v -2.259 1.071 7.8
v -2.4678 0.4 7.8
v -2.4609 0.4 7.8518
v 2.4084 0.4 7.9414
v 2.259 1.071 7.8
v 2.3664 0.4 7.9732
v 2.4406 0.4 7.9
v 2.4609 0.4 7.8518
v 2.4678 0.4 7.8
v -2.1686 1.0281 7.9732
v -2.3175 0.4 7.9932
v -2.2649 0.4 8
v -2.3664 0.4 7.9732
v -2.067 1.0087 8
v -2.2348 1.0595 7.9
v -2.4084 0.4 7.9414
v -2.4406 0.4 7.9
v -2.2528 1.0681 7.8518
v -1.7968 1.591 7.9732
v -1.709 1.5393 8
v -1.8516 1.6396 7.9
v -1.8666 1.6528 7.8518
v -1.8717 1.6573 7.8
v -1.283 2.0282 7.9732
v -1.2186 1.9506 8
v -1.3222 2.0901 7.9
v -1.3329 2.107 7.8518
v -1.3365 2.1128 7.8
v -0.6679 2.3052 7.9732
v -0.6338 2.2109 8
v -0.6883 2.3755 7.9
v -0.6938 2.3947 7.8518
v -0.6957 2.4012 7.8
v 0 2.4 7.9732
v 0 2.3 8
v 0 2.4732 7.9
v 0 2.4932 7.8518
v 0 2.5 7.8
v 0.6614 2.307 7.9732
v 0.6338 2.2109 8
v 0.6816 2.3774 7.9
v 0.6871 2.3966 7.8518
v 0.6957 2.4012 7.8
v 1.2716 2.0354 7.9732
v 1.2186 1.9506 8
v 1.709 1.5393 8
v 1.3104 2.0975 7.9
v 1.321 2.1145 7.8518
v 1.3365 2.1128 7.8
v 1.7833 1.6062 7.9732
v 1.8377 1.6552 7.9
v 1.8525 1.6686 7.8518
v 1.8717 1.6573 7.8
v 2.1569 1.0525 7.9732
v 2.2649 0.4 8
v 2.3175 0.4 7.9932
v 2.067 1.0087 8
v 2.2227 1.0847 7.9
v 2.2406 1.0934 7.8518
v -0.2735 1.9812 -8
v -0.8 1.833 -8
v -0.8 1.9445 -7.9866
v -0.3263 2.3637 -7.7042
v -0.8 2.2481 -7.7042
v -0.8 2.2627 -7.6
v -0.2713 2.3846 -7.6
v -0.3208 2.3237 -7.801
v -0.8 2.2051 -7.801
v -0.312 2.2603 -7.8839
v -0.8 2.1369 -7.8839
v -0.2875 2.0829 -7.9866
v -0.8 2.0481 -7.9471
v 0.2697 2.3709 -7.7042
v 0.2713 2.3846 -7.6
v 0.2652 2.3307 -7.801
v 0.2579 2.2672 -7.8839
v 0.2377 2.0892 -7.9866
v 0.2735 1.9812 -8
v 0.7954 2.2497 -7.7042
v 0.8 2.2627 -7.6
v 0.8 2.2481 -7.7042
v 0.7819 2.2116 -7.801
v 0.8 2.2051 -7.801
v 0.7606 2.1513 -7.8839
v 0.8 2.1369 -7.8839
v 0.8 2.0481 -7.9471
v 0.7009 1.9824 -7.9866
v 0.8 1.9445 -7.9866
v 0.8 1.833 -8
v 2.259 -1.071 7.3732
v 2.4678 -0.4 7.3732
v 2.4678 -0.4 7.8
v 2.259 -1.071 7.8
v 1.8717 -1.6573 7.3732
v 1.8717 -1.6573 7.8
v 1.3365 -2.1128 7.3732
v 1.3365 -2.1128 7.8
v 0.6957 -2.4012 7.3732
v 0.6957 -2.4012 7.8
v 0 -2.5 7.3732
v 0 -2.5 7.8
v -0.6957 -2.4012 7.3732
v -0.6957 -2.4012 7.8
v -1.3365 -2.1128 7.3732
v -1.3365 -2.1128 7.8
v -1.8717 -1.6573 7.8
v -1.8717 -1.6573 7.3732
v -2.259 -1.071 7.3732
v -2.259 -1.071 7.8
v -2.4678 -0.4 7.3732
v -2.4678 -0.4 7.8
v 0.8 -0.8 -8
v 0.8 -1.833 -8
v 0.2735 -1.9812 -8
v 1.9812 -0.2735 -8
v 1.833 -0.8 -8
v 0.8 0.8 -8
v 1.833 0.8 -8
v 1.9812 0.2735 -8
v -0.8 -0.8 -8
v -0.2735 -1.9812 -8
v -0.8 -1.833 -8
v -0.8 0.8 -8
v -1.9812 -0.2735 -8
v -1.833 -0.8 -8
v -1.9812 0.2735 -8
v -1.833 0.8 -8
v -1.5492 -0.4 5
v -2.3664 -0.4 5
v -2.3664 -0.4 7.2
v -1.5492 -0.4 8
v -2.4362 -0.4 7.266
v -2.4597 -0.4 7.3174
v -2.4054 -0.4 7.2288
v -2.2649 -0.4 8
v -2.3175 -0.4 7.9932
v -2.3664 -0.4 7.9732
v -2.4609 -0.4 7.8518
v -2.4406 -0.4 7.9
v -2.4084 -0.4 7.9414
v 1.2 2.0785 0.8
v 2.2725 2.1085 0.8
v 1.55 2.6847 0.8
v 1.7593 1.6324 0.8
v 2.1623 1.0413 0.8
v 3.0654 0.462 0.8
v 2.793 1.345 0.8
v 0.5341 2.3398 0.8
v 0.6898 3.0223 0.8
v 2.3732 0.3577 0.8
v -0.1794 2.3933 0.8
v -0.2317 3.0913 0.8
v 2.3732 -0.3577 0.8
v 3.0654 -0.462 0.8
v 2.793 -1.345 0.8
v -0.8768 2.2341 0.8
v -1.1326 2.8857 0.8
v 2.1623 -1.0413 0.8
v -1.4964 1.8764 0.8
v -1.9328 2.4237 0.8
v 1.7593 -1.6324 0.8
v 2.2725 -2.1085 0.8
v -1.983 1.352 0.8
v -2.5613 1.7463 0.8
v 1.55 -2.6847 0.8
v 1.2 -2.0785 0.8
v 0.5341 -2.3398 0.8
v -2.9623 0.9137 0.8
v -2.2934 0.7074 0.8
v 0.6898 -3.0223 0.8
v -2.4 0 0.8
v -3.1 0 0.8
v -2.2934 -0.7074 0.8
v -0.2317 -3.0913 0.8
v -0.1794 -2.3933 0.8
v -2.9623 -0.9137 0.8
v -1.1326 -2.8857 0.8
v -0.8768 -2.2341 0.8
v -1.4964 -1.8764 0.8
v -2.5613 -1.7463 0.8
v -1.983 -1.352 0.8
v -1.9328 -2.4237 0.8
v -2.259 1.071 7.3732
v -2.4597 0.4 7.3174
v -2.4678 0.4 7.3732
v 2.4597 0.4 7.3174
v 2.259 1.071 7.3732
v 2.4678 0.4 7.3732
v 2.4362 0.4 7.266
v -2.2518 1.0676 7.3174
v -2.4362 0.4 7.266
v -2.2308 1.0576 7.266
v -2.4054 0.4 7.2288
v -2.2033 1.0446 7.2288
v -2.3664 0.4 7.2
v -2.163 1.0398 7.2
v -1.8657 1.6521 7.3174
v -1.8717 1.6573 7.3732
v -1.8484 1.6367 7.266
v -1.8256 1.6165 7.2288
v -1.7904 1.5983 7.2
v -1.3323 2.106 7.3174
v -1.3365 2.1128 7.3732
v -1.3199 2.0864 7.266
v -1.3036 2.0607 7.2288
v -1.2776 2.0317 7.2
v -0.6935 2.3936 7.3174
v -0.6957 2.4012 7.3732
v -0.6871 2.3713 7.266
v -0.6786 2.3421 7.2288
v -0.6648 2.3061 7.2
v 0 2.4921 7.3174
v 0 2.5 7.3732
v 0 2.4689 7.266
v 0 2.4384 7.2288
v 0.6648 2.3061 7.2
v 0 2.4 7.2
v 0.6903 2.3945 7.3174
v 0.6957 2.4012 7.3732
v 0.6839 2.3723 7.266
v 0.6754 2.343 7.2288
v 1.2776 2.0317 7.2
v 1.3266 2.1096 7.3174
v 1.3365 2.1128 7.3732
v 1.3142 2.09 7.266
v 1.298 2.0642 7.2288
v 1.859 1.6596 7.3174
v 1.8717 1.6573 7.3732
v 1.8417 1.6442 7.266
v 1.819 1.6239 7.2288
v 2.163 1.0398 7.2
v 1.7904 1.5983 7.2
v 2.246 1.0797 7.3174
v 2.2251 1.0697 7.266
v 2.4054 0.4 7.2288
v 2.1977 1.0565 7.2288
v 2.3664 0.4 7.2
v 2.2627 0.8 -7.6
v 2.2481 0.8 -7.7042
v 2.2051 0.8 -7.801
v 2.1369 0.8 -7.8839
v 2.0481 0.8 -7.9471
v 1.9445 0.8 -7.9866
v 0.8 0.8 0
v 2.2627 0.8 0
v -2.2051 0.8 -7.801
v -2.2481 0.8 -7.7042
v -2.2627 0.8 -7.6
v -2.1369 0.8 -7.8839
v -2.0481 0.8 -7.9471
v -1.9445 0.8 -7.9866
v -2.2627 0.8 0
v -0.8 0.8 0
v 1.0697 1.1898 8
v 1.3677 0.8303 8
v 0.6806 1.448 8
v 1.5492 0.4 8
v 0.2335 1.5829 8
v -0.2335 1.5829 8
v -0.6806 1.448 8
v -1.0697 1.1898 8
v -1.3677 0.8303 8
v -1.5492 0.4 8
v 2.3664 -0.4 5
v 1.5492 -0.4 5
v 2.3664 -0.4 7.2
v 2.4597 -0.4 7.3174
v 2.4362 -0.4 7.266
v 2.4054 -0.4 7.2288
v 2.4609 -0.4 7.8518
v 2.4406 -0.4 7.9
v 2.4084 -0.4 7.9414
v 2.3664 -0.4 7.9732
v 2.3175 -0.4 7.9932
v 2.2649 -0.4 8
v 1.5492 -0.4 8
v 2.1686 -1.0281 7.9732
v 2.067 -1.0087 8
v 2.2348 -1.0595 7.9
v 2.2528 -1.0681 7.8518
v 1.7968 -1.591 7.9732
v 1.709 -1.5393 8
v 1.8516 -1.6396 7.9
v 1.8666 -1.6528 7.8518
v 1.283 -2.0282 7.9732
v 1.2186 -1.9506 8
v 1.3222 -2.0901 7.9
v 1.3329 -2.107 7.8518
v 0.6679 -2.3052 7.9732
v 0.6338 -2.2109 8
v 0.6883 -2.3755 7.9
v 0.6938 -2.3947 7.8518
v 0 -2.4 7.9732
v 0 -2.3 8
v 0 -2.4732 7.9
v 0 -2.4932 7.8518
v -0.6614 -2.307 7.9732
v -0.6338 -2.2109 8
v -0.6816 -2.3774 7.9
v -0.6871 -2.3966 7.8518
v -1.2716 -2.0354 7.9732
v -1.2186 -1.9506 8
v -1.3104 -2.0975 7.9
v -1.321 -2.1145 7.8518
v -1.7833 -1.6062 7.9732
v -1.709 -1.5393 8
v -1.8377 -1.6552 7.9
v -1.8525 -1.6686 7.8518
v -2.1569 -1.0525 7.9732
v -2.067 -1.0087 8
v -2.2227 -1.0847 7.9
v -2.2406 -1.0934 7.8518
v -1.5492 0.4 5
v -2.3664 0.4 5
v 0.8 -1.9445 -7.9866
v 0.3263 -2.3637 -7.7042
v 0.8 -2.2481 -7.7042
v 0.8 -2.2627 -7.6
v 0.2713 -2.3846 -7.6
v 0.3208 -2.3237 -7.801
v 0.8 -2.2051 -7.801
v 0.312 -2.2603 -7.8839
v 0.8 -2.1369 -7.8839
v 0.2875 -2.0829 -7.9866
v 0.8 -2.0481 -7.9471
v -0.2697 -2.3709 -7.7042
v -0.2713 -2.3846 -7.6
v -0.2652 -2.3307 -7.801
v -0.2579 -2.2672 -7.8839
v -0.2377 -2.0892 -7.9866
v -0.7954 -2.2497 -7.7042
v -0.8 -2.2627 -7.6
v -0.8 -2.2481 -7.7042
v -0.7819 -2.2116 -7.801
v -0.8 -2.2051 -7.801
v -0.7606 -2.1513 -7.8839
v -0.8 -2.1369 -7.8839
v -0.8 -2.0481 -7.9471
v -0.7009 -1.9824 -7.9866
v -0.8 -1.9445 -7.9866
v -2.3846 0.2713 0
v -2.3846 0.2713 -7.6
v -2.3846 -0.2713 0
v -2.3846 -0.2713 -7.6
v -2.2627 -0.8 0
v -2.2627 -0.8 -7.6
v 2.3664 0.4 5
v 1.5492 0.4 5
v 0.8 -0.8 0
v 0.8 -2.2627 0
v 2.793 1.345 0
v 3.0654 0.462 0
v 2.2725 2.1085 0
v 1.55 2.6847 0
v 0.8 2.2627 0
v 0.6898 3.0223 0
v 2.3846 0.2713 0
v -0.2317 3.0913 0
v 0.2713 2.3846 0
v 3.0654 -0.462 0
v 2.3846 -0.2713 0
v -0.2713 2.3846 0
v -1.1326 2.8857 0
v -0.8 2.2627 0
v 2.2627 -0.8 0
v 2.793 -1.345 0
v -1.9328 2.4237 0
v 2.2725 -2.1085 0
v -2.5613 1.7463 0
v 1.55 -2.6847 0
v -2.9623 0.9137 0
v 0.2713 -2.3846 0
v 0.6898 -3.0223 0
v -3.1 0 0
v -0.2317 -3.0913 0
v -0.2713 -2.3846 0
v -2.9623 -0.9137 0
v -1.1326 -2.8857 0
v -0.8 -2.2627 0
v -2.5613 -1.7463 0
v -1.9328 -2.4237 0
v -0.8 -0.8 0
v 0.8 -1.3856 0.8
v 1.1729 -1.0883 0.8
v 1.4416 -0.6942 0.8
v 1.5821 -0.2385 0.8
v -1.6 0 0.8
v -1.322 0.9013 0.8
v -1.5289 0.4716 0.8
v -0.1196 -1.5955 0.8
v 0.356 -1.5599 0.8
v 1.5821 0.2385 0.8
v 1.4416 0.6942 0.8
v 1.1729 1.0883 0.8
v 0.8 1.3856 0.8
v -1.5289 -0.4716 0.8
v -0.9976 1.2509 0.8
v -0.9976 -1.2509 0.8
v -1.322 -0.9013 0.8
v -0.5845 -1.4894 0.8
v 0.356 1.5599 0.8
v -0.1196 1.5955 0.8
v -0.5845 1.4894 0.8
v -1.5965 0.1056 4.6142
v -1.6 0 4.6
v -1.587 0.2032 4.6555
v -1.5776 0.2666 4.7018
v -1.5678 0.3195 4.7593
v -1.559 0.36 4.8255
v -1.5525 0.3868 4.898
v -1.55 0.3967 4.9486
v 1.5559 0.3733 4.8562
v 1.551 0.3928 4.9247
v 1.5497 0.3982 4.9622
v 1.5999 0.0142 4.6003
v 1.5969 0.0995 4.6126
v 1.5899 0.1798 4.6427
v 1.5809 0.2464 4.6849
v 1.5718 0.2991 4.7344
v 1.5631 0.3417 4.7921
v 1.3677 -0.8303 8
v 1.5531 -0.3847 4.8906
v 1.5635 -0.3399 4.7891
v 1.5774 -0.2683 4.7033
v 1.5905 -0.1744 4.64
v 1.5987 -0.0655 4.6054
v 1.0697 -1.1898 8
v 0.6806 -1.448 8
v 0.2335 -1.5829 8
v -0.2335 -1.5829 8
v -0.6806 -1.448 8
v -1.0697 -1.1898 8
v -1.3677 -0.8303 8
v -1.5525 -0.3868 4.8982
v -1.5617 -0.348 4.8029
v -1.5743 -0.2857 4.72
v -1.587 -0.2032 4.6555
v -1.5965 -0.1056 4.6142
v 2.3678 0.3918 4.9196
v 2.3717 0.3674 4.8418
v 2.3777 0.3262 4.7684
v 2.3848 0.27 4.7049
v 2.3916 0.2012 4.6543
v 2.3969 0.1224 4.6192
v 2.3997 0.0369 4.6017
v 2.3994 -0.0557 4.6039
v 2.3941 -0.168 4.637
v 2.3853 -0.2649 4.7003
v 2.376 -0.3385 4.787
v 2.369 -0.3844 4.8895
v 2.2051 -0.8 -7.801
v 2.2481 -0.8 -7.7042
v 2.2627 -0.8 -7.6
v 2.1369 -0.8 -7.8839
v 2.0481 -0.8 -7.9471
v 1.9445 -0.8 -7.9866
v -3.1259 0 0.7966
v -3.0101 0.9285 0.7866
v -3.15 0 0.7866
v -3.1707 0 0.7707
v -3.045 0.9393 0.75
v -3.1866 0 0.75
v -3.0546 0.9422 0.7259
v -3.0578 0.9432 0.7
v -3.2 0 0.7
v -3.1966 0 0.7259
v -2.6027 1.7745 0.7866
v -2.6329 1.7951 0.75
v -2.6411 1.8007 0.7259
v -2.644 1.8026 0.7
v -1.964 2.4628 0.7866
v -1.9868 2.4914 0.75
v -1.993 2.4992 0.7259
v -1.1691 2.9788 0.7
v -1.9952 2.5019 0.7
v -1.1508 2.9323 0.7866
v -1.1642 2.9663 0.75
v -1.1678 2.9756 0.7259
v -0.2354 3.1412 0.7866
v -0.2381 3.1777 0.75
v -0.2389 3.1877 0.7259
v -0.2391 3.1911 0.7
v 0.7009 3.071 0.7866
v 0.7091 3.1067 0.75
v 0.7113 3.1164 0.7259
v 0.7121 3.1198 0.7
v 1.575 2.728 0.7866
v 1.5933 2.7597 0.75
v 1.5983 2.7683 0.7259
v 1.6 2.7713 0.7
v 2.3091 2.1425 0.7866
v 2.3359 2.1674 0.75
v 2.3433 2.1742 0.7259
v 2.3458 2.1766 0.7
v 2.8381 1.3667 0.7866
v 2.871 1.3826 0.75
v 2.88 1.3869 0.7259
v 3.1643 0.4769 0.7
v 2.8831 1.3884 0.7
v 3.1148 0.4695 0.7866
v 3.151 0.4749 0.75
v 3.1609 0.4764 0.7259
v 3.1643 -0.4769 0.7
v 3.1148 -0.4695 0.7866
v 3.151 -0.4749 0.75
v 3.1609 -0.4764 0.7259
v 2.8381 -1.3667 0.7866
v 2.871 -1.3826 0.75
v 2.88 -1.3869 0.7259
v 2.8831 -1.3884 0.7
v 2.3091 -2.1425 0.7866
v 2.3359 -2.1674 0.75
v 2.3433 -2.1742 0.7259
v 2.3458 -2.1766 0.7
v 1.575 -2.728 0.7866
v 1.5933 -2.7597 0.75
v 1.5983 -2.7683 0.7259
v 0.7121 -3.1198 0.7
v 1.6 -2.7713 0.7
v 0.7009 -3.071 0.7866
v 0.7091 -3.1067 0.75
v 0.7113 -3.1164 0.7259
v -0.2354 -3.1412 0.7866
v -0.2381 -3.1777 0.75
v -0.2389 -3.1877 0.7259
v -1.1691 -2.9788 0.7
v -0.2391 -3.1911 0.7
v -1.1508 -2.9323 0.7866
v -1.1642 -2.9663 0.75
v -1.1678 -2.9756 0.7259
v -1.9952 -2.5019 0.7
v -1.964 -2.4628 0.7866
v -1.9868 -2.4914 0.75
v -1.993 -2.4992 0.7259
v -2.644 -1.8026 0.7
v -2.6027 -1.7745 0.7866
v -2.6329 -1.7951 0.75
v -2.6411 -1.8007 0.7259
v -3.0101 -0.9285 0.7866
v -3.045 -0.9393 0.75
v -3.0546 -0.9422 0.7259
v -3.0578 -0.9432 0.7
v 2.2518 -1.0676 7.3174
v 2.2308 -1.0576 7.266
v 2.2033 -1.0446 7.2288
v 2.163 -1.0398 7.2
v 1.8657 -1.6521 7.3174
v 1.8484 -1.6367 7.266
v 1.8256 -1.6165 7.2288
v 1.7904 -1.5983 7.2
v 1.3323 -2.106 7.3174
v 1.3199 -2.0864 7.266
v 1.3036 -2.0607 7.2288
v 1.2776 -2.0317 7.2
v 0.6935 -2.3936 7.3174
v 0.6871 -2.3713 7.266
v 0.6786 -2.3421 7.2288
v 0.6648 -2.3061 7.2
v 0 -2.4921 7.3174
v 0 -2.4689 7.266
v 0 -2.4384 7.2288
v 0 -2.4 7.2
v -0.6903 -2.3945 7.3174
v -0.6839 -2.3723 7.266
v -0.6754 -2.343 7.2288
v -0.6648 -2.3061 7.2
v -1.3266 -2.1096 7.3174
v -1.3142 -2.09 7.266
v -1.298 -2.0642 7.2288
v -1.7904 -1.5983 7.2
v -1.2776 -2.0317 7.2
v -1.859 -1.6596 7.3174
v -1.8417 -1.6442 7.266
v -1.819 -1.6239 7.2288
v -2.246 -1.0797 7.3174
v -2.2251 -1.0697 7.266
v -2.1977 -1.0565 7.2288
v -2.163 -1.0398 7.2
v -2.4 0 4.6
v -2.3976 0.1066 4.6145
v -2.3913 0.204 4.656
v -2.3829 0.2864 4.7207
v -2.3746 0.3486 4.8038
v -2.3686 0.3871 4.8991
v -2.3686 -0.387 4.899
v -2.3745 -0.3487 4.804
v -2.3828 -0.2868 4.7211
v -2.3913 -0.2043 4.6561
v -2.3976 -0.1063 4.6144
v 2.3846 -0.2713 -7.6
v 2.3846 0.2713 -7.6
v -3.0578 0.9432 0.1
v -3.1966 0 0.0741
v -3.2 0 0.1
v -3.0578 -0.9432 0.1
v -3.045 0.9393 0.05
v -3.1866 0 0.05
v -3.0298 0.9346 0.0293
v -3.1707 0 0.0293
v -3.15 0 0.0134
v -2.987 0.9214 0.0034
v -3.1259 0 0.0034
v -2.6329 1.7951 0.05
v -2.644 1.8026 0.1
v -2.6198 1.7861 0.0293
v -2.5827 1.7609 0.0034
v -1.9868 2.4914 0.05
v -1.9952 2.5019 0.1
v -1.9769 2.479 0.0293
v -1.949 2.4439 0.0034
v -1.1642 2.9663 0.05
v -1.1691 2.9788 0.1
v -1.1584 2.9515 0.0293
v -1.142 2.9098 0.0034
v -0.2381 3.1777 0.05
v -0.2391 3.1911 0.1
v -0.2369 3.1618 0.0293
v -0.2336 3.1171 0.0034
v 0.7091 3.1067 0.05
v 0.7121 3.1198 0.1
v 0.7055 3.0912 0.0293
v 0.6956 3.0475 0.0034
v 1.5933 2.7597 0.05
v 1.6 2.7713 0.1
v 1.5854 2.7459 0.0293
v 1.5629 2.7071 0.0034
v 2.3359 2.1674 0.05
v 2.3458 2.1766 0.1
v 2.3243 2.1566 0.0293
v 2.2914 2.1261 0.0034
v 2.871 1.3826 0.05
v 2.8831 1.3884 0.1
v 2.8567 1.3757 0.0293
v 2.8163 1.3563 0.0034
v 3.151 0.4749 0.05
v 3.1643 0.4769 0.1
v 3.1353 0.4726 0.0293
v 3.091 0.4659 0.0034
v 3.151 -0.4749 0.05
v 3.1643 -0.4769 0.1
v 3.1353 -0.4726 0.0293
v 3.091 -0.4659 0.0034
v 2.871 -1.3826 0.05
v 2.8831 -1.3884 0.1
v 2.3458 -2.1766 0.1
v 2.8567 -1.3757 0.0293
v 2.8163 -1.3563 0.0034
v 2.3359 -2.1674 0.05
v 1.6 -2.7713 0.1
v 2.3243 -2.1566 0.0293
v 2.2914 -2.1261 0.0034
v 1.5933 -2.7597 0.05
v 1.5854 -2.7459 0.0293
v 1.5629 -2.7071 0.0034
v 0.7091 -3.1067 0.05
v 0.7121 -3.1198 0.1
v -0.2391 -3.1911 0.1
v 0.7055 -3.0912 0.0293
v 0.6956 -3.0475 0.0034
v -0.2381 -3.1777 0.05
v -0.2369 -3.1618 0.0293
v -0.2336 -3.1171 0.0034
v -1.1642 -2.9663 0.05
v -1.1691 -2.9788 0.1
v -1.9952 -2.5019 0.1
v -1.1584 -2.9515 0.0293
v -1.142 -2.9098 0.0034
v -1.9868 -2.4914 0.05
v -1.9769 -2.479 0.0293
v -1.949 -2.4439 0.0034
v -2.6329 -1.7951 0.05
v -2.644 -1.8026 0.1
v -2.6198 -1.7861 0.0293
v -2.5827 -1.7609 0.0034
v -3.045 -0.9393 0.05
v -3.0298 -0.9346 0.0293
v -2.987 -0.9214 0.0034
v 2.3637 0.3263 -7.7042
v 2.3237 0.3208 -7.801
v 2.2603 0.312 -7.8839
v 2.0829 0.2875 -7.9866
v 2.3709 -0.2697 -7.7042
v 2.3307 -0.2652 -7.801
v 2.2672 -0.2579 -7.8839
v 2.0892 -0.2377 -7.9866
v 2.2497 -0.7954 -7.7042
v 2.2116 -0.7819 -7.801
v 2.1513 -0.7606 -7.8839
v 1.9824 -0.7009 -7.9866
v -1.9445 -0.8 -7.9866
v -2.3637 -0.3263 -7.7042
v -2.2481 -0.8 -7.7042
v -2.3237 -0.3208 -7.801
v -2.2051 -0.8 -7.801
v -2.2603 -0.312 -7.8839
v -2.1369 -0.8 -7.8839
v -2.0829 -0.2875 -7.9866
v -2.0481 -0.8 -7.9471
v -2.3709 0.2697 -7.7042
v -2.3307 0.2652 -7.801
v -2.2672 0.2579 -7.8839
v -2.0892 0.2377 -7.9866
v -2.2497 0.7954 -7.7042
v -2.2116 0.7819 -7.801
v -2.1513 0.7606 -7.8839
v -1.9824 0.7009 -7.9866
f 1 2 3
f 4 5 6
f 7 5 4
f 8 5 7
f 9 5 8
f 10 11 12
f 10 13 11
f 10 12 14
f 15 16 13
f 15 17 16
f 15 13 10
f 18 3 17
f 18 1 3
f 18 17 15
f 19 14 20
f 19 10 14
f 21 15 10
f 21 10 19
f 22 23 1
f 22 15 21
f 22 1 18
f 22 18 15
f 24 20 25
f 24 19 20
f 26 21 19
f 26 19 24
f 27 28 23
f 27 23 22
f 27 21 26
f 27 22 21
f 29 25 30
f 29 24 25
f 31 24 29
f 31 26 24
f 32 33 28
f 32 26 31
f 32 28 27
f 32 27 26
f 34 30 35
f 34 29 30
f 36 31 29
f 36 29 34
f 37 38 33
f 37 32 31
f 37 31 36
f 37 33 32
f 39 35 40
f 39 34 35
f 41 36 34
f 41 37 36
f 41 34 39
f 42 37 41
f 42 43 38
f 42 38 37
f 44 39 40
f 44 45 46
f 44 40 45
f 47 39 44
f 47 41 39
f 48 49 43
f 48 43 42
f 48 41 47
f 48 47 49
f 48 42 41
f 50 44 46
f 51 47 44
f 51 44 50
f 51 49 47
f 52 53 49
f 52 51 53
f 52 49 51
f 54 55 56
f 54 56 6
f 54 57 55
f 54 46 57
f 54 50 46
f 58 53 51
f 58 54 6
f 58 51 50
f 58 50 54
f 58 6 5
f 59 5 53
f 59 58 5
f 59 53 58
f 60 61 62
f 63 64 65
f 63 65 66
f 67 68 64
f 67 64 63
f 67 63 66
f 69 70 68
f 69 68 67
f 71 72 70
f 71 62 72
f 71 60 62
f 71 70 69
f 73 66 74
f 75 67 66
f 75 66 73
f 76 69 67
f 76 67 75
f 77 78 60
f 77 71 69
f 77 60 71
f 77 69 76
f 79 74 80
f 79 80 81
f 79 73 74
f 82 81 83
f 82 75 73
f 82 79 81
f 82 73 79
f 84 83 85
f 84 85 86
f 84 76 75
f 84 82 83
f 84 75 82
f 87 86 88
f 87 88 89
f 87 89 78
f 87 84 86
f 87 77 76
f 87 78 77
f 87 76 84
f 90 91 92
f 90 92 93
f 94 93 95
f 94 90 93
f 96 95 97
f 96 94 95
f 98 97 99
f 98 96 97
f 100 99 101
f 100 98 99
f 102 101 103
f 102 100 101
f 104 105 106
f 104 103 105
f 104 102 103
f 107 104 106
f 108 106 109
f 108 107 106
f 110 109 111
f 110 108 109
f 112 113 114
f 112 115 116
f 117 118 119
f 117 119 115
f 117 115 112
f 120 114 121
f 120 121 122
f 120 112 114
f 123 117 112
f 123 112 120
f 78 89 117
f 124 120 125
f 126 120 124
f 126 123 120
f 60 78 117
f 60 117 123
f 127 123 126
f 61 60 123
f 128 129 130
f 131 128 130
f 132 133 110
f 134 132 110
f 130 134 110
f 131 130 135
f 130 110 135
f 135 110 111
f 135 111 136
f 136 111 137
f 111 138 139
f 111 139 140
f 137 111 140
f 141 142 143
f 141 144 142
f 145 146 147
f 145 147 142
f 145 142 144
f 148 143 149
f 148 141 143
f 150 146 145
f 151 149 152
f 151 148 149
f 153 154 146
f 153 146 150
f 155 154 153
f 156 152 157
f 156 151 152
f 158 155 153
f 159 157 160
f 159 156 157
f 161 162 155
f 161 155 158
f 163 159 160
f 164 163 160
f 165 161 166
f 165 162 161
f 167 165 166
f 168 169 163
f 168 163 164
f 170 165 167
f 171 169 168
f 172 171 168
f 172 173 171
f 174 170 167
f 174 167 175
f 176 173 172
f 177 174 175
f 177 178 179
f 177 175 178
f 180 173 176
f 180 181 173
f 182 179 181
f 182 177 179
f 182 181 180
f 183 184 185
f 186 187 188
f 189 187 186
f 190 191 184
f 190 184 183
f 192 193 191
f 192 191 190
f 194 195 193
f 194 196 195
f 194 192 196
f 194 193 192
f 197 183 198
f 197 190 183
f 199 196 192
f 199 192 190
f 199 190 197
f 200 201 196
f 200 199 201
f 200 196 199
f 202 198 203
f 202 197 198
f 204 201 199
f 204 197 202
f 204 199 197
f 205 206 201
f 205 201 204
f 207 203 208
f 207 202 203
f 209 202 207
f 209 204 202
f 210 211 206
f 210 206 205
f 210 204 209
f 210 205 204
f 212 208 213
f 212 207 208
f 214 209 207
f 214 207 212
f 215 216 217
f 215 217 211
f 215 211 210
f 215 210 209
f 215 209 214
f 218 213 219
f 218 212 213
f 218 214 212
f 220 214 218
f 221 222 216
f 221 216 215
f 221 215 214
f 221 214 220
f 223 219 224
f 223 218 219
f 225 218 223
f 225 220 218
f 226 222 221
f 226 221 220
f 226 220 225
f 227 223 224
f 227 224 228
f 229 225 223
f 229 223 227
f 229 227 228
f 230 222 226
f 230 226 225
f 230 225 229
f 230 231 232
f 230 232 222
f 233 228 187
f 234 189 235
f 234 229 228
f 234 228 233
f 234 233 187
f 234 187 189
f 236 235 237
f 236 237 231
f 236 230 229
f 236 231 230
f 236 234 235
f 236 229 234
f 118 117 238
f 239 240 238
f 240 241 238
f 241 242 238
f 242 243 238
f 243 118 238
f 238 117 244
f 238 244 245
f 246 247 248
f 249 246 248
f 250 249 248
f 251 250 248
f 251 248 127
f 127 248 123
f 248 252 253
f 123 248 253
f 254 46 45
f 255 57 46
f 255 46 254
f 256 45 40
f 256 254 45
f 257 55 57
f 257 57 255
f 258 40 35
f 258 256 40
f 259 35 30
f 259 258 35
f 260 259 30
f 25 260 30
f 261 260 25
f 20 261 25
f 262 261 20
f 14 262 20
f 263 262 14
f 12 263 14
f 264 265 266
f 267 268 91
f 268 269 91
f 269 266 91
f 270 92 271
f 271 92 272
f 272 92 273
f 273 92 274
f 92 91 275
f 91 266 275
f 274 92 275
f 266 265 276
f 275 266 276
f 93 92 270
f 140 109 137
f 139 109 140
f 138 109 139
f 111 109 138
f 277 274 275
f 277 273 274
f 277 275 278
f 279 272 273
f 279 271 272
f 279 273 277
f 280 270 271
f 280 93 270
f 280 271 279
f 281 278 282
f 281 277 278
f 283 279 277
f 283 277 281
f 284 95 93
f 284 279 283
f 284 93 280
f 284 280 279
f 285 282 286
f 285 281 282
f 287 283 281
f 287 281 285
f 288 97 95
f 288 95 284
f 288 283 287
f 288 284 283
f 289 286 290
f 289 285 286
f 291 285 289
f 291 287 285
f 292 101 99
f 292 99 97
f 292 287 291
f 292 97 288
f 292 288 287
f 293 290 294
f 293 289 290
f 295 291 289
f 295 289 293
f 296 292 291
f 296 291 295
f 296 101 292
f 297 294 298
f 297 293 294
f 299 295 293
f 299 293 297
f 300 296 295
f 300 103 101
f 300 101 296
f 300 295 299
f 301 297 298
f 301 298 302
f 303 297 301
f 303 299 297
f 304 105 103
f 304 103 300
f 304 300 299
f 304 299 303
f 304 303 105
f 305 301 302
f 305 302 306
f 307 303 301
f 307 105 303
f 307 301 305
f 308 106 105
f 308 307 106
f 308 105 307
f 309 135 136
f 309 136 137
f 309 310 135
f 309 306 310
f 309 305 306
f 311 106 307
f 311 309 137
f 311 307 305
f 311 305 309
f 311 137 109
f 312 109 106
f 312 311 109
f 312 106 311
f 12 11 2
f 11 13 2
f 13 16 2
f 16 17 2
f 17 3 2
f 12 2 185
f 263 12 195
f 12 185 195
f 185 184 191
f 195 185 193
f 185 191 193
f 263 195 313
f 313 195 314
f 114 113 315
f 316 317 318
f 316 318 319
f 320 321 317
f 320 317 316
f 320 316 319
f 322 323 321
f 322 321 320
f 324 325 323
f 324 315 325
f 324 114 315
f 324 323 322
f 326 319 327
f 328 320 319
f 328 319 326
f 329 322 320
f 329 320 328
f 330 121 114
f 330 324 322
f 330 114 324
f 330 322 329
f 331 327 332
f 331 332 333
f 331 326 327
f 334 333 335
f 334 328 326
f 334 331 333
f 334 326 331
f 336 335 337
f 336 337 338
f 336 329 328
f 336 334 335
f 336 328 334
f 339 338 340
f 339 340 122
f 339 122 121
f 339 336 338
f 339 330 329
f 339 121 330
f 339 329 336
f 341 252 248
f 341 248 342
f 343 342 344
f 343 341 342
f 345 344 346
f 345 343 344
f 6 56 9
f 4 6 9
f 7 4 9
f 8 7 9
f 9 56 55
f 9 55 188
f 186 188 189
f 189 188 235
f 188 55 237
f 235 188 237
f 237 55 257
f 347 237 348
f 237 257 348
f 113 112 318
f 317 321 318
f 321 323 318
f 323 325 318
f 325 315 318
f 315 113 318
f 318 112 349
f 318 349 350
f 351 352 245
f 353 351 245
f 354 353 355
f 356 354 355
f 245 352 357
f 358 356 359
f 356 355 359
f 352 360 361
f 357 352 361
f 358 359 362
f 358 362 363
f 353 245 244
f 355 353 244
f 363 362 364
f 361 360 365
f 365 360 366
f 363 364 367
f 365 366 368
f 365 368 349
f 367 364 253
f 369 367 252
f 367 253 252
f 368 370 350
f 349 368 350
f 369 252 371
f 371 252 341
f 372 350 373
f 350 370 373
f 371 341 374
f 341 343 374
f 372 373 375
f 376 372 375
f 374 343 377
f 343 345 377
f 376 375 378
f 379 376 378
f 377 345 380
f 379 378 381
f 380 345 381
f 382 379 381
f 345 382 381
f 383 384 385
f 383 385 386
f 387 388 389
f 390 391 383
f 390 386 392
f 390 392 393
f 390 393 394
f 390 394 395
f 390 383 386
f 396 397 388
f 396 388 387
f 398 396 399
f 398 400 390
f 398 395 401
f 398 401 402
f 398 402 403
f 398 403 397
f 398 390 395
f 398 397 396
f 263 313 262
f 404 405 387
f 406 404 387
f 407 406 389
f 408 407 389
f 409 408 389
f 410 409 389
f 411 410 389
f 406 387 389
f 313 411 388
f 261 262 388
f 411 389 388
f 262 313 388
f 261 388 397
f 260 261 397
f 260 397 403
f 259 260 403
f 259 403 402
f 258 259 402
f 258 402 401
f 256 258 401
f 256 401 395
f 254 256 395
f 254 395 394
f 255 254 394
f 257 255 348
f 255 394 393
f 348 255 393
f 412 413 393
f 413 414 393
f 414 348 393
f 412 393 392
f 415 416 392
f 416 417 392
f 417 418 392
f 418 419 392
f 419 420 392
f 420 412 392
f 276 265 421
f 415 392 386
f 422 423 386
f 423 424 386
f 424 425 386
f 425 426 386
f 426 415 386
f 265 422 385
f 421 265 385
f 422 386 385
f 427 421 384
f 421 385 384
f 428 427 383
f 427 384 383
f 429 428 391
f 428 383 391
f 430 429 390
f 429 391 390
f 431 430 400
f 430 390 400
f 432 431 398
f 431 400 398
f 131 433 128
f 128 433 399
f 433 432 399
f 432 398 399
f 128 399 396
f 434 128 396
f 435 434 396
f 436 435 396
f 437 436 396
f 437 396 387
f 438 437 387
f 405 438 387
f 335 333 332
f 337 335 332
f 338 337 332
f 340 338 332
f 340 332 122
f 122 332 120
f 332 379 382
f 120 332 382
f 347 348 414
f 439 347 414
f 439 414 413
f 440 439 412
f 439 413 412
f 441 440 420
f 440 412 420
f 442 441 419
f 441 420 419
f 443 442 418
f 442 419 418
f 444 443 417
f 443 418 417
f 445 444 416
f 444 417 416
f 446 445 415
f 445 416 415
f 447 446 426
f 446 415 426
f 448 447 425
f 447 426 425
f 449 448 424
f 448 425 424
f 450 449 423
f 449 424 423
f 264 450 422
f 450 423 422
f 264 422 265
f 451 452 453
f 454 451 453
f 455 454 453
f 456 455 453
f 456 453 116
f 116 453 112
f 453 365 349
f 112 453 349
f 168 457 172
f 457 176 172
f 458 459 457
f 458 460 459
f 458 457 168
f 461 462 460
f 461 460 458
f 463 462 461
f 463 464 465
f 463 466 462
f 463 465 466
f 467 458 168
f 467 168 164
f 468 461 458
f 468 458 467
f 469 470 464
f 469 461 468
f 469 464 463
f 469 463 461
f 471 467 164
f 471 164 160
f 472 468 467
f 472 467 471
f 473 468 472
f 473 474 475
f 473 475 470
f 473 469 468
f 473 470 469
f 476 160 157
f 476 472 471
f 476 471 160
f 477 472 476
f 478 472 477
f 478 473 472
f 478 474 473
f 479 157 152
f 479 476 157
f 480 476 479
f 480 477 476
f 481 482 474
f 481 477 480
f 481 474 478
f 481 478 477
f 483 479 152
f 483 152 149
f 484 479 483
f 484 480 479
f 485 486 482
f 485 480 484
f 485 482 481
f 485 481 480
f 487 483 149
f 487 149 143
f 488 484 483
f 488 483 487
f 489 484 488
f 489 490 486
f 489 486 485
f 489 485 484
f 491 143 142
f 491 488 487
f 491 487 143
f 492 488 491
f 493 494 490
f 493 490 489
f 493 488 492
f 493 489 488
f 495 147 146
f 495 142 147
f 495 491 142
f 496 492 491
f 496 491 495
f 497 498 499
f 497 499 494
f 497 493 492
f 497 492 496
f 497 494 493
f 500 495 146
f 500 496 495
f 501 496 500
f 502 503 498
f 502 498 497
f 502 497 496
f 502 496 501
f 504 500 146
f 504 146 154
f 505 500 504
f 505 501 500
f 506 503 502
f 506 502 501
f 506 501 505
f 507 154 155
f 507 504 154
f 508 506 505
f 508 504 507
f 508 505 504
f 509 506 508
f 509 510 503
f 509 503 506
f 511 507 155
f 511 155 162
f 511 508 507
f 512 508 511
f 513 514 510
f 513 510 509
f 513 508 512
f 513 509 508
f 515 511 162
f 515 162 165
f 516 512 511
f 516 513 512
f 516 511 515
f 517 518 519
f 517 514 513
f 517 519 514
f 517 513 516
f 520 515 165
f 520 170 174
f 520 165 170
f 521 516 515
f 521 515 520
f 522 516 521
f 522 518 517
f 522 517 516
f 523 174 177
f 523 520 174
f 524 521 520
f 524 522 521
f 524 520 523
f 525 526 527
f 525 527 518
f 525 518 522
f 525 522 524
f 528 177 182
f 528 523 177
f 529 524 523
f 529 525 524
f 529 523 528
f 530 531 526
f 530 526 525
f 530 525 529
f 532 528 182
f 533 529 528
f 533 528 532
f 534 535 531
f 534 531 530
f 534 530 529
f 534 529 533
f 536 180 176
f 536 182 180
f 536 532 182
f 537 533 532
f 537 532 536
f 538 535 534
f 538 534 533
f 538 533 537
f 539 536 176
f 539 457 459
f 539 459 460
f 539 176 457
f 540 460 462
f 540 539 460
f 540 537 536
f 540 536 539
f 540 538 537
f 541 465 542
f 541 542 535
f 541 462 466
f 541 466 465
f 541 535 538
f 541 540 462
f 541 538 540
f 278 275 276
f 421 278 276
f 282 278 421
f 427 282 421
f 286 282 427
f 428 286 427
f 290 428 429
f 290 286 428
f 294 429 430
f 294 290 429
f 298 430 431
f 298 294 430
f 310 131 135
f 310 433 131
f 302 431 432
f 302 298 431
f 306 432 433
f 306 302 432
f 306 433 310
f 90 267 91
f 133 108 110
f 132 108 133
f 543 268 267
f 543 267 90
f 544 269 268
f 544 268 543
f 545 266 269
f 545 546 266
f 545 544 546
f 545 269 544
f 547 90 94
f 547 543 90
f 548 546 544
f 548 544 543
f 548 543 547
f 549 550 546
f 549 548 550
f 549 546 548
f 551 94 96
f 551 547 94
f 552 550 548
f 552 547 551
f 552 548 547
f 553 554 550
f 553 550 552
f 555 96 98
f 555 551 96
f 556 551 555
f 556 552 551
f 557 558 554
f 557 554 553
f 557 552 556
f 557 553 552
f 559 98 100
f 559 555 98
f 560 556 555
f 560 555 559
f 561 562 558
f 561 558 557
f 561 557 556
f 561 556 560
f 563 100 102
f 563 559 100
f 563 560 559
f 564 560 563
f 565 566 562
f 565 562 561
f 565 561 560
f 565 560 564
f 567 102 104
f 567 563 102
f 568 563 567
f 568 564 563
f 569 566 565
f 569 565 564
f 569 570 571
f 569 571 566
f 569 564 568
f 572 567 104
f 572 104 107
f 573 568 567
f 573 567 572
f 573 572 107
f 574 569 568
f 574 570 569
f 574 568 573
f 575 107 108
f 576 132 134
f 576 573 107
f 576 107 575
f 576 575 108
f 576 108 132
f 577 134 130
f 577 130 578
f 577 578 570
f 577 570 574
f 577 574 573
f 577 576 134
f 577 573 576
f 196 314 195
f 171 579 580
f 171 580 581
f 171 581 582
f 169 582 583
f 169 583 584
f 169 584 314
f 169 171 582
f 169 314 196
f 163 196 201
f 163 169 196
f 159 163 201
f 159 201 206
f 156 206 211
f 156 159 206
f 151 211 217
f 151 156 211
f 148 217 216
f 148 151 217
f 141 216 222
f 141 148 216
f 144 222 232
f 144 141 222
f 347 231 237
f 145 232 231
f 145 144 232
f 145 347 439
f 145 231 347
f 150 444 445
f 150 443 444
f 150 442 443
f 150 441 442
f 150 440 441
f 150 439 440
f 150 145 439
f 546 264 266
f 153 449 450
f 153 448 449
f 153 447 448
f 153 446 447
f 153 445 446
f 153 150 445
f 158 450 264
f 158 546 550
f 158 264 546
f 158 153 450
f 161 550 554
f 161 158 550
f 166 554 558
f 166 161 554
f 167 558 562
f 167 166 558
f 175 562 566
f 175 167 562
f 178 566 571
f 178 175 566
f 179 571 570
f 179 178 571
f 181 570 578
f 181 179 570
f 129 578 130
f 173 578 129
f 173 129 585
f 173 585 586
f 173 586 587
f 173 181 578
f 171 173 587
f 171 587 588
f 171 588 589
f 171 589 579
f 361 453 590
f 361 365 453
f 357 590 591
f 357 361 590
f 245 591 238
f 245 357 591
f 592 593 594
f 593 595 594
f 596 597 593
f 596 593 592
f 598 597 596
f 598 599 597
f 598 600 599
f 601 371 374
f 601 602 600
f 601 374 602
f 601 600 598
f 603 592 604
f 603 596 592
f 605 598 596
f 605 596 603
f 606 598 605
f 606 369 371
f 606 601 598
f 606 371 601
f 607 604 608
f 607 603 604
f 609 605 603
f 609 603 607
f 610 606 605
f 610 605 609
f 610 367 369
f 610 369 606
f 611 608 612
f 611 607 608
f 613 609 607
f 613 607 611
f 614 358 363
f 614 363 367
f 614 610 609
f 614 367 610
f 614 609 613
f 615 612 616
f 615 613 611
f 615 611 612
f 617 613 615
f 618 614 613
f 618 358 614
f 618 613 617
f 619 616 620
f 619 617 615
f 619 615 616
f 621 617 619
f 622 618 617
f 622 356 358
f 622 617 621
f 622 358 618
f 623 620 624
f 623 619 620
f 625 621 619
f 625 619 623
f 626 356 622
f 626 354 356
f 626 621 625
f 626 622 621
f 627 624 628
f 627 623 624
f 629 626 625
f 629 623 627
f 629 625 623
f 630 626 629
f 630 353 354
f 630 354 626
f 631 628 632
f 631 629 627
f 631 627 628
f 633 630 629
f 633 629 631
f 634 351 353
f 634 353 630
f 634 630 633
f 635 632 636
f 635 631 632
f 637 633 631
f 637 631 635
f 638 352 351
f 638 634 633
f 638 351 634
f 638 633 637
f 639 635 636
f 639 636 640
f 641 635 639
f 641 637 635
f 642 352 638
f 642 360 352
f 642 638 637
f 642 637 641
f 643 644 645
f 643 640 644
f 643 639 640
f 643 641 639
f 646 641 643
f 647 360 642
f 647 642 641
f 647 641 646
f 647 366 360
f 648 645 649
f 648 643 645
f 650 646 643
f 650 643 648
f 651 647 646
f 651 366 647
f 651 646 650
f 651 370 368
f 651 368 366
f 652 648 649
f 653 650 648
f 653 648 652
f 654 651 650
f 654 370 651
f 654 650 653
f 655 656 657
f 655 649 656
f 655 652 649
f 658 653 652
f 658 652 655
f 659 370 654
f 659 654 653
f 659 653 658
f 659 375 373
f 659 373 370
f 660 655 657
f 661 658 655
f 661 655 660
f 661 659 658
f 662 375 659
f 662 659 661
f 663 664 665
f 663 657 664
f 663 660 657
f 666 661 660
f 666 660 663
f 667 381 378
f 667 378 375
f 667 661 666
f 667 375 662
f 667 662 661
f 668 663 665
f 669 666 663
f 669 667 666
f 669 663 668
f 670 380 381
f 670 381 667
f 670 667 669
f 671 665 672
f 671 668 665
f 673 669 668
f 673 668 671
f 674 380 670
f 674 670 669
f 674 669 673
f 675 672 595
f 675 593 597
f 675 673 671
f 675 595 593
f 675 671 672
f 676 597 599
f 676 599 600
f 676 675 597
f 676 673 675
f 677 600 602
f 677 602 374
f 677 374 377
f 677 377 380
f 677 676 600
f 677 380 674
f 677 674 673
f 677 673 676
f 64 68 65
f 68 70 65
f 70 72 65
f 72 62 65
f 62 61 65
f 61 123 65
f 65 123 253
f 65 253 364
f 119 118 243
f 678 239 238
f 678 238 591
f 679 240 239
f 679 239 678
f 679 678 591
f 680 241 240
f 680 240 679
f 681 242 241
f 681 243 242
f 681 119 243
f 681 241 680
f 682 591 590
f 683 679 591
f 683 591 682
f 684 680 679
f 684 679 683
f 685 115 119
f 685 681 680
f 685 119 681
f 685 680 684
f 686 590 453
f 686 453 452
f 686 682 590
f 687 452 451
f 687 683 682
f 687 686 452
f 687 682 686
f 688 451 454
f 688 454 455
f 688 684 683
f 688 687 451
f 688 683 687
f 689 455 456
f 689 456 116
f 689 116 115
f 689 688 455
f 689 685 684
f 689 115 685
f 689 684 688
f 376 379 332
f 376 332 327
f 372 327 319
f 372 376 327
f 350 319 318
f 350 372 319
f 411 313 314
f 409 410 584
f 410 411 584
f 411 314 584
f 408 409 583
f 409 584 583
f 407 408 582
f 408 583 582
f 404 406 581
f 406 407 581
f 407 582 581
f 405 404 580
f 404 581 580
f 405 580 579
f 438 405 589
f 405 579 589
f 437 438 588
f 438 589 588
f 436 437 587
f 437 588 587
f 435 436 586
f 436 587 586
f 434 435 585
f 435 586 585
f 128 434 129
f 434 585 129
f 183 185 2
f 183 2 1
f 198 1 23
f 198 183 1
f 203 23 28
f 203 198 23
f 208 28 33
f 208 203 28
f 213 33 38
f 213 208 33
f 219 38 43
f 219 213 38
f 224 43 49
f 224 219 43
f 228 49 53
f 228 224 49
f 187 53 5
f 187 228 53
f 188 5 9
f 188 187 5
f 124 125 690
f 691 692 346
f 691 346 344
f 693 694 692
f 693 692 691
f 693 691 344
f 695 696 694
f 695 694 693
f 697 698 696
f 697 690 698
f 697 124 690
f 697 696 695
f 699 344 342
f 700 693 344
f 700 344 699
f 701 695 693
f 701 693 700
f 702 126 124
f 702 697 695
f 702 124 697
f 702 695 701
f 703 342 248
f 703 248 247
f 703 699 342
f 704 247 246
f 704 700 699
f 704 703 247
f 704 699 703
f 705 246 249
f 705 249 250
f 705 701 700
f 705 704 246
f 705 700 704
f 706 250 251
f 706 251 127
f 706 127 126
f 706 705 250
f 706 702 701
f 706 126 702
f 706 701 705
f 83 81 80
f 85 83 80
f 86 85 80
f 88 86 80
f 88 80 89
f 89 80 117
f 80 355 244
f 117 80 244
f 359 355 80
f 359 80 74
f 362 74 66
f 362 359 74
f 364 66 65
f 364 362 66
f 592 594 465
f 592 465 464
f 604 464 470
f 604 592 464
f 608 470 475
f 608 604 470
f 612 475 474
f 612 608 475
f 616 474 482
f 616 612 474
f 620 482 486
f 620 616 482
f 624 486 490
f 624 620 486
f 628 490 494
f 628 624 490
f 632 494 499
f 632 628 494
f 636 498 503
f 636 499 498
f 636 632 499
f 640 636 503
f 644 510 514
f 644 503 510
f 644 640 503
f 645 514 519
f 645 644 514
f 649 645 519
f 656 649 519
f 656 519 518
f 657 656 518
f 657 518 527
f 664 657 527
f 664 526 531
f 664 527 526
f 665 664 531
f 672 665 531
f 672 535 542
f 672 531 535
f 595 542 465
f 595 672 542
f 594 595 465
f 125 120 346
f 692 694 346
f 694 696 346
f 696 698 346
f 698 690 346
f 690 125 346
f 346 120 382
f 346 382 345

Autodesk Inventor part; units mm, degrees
ref_plane "YZ Plane" through (0, 0, 0) normal (1, 0, 0) x (0, 1, 0)
ref_plane "XZ Plane" through (0, 0, 0) normal (0, 1, 0) x (-1, 0, 0)
ref_plane "XY Plane" through (0, 0, 0) normal (0, 0, 1) x (1, 0, 0)
sketch "Sketch1" plane through (0, 0, 0) normal (0, 1, 0) x (-1, 0, 0)
  line L0 (2.4, 7.2) -> (2.4, 0.8)
  line L1 (3.2, 0.8) -> (2.4, 0.8)
  line L2 (3.2, 0.8) -> (3.2, 0)
  line L3 (0, 0) -> (3.2, 0)
  line L4 (2.5, 8) -> (2.5, 7.2)
  line L5 (2.5, 8) -> (1.6, 8)
  line L6 (0, -1.6) -> (0, 9.6) projected
  line L7 (2.4, 7.2) -> (2.5, 7.2)
  line L8 (3.72, 0) -> (-0.62, 0) projected
  line L9 (0, 0) -> (0, 0.8)
  line L10 (0, 0.8) -> (1.6, 0.8)
  line L11 (1.6, 8) -> (1.6, 0.8)
  dimension "d1" = 4.8
  dimension "d2" = 5
  dimension "d6" = 8
  dimension "d7" = 0.8
  dimension "d8" = 6.4
  dimension "d9" = 0.8
  dimension "d10" = 0
  dimension "d40" = 3.2
revolve "Revolution1" add sketch "Sketch1" angle 360 about axis through (0, 0, -10) along (0, 0, 1)
fillet "Fillet1" radius 0.2 2 edges at (2.5, 0, 8) (2.5, 0, 7.2)
fillet "Fillet1" radius 0.1 2 edges at (3.2, 0, 0.8) (3.2, 0, 0)
sketch "Sketch2" plane through (0, 0, 0) normal (1, 0, 0) x (0, 1, 0)
  line L0 (-1.6, 8) -> (1.6, 8) projected
  line L1 (-0.4, 8) -> (0.4, 8)
  line L2 (0.4, 8) -> (0.4, 5)
  line L3 (-0.4, 5) -> (-0.4, 8)
  arc A0 (-0.4, 5) -> (0.4, 5) centre (0, 5) ccw
  point P0 (0, 0)
  point P1 (0, 8)
  dimension "d34" = 3.4
  dimension "d41" = 0.8
extrude "Extrusion2" cut sketch "Sketch2" along normal through all both and the other way through all
sketch "Sketch3" plane through (0, 0, 0) normal (0, 0, -1) x (-1, 0, 0)
  circle A0 centre (0, 0) radius 3.1 projected
  circle A1 centre (0, 0) radius 2.4 construction
  line L0 (-0.8, 2.2627) -> (-0.8, 0.8)
  line L1 (-0.8, 0.8) -> (-2.2627, 0.8)
  line L2 (-2.2627, -0.8) -> (-0.8, -0.8)
  line L3 (-0.8, -0.8) -> (-0.8, -2.2627)
  line L4 (0.8, -2.2627) -> (0.8, -0.8)
  line L5 (0.8, -0.8) -> (2.2627, -0.8)
  line L6 (2.2627, 0.8) -> (0.8, 0.8)
  line L7 (0.8, 0.8) -> (0.8, 2.2627)
  arc A2 (0.8, 2.2627) -> (-0.8, 2.2627) centre (0, 0) ccw
  arc A3 (-2.2627, 0.8) -> (-2.2627, -0.8) centre (0, 0) ccw
  arc A4 (-0.8, -2.2627) -> (0.8, -2.2627) centre (0, 0) ccw
  arc A5 (2.2627, -0.8) -> (2.2627, 0.8) centre (0, 0) ccw
  dimension "d35" = 4.8
  dimension "d36" = 1.6
extrude "Extrusion3" add sketch "Sketch3" along normal blind 8 contours A2 L7 L6 A5 L5 L4 A4 L3 L2 A3 L1 L0
fillet "Fillet2" radius 0.4 4 edges at (0, 2.4, -8) (2.4, 0, -8) (0, -2.4, -8) (-2.4, 0, -8)
equation "\"d1\" = kd"
equation "\"d2\" = tpcd"
equation "\"d6\" = lu"
equation "\"d7\" = d9"
equation "\"d8\" = tsd"
equation "\"d9\" = tsl"
equation "\"d40\" = rd"
equation "\"d27\" = pinf"
equation "\"d28\" = lf"
equation "\"d34\" = tpnl"
equation "\"d41\" = tpnw"
equation "\"d35\" = kd"
equation "\"d36\" = axlet"
equation "\"d37\" = lu"
equation "\"d39\" = tf"
equation "\"kd\" = 4.8"
equation "\"tpcd\" = 5"
equation "\"lu\" = 8"
equation "\"tsd\" = 6.4"
equation "\"tsl\" = 0.8"
equation "\"rd\" = 3.2"
equation "\"pinf\" = 0.2"
equation "\"lf\" = 0.1"
equation "\"tpnl\" = 3.4"
equation "\"tpnw\" = 0.8"
equation "\"axlet\" = 1.6"
equation "\"tf\" = 0.4"
properties part number "43093-Blue" material "ABS Plastic"
